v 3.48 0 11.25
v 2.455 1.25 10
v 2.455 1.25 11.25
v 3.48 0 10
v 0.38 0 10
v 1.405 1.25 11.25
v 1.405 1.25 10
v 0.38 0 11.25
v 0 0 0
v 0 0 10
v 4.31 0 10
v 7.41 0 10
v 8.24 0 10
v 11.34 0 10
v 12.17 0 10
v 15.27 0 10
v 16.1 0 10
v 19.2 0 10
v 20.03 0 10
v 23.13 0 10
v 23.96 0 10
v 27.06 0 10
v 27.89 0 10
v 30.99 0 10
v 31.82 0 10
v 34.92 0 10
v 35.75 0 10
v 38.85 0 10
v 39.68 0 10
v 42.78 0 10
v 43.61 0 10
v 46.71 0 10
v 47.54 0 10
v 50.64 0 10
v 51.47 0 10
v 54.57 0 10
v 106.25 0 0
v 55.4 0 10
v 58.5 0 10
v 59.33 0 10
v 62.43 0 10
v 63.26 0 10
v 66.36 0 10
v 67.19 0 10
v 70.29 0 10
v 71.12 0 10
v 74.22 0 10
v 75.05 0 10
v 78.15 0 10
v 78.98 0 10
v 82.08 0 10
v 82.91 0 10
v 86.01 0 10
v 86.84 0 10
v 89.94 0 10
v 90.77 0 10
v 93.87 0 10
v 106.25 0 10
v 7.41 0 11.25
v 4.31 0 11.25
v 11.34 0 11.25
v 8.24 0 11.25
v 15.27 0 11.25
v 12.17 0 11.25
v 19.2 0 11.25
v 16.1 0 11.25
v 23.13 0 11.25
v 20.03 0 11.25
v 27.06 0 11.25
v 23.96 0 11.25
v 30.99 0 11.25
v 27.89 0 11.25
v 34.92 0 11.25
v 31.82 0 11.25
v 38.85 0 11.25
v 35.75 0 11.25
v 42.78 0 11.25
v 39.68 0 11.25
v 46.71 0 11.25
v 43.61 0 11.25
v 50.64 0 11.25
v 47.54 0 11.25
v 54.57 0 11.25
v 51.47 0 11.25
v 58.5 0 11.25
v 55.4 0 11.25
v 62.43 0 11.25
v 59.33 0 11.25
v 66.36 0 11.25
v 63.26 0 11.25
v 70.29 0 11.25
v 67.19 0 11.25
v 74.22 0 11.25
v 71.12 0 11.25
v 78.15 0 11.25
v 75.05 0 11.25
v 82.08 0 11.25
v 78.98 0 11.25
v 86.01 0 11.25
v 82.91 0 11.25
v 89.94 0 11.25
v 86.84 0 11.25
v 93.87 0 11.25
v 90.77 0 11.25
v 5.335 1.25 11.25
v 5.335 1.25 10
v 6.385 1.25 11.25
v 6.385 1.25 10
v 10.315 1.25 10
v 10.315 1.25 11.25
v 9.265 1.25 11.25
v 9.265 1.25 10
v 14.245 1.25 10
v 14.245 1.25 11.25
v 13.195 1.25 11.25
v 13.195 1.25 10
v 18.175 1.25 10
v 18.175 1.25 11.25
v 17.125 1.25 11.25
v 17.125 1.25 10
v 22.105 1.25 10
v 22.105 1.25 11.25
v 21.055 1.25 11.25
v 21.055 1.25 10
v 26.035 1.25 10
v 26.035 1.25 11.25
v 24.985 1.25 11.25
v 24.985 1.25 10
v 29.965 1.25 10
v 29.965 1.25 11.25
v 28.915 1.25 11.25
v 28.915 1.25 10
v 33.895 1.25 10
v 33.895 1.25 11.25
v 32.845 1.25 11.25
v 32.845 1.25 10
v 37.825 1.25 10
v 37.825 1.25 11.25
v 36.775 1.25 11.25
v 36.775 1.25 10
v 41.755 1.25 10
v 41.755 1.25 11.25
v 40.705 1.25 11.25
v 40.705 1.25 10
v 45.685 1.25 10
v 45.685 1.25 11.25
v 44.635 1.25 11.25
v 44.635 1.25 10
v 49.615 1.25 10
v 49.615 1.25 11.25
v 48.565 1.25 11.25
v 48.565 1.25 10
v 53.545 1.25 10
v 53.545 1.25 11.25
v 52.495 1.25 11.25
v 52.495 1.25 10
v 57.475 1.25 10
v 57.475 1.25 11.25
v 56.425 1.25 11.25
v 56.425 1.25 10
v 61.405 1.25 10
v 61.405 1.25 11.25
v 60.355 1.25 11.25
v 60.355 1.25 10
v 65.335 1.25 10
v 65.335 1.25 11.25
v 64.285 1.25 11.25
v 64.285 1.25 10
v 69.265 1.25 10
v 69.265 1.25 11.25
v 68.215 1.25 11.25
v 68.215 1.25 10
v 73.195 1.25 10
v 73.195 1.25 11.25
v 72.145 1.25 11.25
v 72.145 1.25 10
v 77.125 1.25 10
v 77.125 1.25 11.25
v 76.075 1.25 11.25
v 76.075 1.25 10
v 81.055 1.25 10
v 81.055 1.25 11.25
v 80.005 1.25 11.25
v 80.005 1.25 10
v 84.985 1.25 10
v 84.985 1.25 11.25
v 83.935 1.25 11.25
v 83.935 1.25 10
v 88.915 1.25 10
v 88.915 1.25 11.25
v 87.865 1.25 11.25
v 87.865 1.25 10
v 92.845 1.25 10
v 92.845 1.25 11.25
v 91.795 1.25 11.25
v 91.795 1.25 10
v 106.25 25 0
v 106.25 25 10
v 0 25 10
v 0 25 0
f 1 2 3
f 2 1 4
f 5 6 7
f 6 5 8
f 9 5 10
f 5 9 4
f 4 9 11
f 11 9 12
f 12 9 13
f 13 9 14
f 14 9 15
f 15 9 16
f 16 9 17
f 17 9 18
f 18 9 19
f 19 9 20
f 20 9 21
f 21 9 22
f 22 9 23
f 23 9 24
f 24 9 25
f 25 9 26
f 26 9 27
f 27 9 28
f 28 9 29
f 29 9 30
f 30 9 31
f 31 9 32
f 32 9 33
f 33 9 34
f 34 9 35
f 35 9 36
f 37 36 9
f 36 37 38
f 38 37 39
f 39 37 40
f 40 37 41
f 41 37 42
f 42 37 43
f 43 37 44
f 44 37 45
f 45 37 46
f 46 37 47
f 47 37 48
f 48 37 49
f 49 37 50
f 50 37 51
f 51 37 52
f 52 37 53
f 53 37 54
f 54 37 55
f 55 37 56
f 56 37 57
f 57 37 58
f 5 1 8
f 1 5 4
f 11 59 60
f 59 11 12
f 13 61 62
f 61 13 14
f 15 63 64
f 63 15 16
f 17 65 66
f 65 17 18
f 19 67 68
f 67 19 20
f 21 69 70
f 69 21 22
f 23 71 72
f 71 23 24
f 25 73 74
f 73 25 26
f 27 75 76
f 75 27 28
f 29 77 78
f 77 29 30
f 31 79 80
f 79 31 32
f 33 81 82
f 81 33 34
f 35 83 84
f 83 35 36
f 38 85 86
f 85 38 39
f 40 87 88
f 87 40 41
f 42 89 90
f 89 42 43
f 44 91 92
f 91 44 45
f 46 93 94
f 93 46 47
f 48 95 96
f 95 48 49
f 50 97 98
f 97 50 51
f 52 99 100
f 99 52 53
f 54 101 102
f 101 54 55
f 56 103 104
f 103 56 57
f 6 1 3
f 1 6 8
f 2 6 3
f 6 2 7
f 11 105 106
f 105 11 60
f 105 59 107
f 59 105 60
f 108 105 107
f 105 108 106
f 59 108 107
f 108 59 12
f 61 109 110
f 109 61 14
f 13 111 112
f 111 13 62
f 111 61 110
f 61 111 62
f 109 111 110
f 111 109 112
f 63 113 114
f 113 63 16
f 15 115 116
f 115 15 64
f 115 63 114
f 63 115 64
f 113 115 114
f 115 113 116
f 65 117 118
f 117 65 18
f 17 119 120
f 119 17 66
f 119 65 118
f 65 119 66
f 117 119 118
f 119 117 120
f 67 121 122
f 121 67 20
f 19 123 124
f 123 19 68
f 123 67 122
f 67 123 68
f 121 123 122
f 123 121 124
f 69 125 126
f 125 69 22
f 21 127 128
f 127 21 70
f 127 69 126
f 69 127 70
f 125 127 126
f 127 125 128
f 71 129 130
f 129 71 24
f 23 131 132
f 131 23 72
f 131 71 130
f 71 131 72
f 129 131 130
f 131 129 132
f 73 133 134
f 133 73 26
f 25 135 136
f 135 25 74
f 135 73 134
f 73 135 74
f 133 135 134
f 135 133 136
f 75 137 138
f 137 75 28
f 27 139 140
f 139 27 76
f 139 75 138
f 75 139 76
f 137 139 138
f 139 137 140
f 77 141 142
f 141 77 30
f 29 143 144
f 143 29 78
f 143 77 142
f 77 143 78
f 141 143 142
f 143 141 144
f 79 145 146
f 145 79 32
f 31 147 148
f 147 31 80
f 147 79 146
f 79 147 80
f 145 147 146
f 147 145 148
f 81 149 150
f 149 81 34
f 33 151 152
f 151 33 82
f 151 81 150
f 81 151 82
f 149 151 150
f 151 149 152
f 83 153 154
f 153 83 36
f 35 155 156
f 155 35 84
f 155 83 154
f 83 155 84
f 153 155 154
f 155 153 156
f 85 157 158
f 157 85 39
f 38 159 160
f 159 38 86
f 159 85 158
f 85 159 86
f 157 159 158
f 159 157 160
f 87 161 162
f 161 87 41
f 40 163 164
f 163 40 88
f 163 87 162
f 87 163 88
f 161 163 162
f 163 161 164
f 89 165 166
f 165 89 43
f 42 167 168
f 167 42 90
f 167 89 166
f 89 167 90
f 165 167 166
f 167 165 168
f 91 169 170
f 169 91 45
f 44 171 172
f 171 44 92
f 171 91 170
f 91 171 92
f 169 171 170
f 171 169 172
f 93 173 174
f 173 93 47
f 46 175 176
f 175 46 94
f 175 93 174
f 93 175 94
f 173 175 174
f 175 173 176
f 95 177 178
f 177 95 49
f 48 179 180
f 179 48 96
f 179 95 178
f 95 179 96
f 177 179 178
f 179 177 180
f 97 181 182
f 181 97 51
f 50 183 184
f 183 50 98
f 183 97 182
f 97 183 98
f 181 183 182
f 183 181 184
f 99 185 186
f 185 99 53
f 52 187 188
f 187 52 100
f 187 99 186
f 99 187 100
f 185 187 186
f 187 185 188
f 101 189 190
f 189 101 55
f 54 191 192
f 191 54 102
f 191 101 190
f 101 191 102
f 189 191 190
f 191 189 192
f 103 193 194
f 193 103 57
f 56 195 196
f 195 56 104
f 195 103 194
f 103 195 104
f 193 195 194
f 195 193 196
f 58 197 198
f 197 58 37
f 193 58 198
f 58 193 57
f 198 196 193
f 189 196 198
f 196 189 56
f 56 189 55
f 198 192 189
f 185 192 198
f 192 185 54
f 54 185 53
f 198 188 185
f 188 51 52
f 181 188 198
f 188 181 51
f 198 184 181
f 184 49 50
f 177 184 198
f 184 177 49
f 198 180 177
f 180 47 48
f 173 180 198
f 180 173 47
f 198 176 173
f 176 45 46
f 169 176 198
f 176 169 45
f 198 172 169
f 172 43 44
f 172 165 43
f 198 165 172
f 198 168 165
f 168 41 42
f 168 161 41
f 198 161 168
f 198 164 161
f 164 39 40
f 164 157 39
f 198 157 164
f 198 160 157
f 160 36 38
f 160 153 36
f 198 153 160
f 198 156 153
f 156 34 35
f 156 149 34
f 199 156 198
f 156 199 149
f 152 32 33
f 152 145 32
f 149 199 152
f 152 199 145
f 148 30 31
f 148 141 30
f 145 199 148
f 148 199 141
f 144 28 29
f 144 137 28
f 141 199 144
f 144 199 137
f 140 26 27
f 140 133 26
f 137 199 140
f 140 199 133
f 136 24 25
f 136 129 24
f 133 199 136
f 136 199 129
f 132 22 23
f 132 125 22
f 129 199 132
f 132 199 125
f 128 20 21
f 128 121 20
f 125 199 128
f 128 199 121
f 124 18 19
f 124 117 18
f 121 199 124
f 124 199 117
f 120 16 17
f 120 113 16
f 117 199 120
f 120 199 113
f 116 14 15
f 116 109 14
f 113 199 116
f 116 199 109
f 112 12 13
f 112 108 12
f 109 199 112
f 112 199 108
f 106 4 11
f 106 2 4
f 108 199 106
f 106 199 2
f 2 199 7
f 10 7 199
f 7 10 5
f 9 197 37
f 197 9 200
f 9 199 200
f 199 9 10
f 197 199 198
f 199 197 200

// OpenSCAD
$fn = 32;

// ----------------------------------------------------------------------
// Gear rack: m=1.25 z=24, 106.25 x 25 x 11.25 mm
// ----------------------------------------------------------------------

// --- parameters (mm) ---
length = 106.25;          // rack length, X
width = 25;               // rack width, Y
height = 11.25;           // overall height, Z
module_m = 1.25;          // module
back_t = 10;              // tooth root line height
pitch = 3.93;             // circular pitch
tip_w = 1.05;             // tooth thickness at the tip
root_w = 3.1;             // tooth thickness at the root line
sink = 0.6;               // tooth root overlap into the body

tooth_span = 94.25;

module tooth(x0) {
  /* 20 deg flank profile, sunk into the body for a positive overlap */
  translate([x0, 0, back_t - sink])
    linear_extrude(height = height - back_t + sink)
      polygon(points = [[-root_w / 2, 0], [root_w / 2, 0],
                        [tip_w / 2, height - back_t],
                        [-tip_w / 2, height - back_t]]);
}

difference() {
  union() {
    cube([length, width, back_t]);
    for (i = [0 : 24 - 1])
      tooth((i + 0.5) * pitch + (tooth_span - 24 * pitch) / 2);
  }
}
